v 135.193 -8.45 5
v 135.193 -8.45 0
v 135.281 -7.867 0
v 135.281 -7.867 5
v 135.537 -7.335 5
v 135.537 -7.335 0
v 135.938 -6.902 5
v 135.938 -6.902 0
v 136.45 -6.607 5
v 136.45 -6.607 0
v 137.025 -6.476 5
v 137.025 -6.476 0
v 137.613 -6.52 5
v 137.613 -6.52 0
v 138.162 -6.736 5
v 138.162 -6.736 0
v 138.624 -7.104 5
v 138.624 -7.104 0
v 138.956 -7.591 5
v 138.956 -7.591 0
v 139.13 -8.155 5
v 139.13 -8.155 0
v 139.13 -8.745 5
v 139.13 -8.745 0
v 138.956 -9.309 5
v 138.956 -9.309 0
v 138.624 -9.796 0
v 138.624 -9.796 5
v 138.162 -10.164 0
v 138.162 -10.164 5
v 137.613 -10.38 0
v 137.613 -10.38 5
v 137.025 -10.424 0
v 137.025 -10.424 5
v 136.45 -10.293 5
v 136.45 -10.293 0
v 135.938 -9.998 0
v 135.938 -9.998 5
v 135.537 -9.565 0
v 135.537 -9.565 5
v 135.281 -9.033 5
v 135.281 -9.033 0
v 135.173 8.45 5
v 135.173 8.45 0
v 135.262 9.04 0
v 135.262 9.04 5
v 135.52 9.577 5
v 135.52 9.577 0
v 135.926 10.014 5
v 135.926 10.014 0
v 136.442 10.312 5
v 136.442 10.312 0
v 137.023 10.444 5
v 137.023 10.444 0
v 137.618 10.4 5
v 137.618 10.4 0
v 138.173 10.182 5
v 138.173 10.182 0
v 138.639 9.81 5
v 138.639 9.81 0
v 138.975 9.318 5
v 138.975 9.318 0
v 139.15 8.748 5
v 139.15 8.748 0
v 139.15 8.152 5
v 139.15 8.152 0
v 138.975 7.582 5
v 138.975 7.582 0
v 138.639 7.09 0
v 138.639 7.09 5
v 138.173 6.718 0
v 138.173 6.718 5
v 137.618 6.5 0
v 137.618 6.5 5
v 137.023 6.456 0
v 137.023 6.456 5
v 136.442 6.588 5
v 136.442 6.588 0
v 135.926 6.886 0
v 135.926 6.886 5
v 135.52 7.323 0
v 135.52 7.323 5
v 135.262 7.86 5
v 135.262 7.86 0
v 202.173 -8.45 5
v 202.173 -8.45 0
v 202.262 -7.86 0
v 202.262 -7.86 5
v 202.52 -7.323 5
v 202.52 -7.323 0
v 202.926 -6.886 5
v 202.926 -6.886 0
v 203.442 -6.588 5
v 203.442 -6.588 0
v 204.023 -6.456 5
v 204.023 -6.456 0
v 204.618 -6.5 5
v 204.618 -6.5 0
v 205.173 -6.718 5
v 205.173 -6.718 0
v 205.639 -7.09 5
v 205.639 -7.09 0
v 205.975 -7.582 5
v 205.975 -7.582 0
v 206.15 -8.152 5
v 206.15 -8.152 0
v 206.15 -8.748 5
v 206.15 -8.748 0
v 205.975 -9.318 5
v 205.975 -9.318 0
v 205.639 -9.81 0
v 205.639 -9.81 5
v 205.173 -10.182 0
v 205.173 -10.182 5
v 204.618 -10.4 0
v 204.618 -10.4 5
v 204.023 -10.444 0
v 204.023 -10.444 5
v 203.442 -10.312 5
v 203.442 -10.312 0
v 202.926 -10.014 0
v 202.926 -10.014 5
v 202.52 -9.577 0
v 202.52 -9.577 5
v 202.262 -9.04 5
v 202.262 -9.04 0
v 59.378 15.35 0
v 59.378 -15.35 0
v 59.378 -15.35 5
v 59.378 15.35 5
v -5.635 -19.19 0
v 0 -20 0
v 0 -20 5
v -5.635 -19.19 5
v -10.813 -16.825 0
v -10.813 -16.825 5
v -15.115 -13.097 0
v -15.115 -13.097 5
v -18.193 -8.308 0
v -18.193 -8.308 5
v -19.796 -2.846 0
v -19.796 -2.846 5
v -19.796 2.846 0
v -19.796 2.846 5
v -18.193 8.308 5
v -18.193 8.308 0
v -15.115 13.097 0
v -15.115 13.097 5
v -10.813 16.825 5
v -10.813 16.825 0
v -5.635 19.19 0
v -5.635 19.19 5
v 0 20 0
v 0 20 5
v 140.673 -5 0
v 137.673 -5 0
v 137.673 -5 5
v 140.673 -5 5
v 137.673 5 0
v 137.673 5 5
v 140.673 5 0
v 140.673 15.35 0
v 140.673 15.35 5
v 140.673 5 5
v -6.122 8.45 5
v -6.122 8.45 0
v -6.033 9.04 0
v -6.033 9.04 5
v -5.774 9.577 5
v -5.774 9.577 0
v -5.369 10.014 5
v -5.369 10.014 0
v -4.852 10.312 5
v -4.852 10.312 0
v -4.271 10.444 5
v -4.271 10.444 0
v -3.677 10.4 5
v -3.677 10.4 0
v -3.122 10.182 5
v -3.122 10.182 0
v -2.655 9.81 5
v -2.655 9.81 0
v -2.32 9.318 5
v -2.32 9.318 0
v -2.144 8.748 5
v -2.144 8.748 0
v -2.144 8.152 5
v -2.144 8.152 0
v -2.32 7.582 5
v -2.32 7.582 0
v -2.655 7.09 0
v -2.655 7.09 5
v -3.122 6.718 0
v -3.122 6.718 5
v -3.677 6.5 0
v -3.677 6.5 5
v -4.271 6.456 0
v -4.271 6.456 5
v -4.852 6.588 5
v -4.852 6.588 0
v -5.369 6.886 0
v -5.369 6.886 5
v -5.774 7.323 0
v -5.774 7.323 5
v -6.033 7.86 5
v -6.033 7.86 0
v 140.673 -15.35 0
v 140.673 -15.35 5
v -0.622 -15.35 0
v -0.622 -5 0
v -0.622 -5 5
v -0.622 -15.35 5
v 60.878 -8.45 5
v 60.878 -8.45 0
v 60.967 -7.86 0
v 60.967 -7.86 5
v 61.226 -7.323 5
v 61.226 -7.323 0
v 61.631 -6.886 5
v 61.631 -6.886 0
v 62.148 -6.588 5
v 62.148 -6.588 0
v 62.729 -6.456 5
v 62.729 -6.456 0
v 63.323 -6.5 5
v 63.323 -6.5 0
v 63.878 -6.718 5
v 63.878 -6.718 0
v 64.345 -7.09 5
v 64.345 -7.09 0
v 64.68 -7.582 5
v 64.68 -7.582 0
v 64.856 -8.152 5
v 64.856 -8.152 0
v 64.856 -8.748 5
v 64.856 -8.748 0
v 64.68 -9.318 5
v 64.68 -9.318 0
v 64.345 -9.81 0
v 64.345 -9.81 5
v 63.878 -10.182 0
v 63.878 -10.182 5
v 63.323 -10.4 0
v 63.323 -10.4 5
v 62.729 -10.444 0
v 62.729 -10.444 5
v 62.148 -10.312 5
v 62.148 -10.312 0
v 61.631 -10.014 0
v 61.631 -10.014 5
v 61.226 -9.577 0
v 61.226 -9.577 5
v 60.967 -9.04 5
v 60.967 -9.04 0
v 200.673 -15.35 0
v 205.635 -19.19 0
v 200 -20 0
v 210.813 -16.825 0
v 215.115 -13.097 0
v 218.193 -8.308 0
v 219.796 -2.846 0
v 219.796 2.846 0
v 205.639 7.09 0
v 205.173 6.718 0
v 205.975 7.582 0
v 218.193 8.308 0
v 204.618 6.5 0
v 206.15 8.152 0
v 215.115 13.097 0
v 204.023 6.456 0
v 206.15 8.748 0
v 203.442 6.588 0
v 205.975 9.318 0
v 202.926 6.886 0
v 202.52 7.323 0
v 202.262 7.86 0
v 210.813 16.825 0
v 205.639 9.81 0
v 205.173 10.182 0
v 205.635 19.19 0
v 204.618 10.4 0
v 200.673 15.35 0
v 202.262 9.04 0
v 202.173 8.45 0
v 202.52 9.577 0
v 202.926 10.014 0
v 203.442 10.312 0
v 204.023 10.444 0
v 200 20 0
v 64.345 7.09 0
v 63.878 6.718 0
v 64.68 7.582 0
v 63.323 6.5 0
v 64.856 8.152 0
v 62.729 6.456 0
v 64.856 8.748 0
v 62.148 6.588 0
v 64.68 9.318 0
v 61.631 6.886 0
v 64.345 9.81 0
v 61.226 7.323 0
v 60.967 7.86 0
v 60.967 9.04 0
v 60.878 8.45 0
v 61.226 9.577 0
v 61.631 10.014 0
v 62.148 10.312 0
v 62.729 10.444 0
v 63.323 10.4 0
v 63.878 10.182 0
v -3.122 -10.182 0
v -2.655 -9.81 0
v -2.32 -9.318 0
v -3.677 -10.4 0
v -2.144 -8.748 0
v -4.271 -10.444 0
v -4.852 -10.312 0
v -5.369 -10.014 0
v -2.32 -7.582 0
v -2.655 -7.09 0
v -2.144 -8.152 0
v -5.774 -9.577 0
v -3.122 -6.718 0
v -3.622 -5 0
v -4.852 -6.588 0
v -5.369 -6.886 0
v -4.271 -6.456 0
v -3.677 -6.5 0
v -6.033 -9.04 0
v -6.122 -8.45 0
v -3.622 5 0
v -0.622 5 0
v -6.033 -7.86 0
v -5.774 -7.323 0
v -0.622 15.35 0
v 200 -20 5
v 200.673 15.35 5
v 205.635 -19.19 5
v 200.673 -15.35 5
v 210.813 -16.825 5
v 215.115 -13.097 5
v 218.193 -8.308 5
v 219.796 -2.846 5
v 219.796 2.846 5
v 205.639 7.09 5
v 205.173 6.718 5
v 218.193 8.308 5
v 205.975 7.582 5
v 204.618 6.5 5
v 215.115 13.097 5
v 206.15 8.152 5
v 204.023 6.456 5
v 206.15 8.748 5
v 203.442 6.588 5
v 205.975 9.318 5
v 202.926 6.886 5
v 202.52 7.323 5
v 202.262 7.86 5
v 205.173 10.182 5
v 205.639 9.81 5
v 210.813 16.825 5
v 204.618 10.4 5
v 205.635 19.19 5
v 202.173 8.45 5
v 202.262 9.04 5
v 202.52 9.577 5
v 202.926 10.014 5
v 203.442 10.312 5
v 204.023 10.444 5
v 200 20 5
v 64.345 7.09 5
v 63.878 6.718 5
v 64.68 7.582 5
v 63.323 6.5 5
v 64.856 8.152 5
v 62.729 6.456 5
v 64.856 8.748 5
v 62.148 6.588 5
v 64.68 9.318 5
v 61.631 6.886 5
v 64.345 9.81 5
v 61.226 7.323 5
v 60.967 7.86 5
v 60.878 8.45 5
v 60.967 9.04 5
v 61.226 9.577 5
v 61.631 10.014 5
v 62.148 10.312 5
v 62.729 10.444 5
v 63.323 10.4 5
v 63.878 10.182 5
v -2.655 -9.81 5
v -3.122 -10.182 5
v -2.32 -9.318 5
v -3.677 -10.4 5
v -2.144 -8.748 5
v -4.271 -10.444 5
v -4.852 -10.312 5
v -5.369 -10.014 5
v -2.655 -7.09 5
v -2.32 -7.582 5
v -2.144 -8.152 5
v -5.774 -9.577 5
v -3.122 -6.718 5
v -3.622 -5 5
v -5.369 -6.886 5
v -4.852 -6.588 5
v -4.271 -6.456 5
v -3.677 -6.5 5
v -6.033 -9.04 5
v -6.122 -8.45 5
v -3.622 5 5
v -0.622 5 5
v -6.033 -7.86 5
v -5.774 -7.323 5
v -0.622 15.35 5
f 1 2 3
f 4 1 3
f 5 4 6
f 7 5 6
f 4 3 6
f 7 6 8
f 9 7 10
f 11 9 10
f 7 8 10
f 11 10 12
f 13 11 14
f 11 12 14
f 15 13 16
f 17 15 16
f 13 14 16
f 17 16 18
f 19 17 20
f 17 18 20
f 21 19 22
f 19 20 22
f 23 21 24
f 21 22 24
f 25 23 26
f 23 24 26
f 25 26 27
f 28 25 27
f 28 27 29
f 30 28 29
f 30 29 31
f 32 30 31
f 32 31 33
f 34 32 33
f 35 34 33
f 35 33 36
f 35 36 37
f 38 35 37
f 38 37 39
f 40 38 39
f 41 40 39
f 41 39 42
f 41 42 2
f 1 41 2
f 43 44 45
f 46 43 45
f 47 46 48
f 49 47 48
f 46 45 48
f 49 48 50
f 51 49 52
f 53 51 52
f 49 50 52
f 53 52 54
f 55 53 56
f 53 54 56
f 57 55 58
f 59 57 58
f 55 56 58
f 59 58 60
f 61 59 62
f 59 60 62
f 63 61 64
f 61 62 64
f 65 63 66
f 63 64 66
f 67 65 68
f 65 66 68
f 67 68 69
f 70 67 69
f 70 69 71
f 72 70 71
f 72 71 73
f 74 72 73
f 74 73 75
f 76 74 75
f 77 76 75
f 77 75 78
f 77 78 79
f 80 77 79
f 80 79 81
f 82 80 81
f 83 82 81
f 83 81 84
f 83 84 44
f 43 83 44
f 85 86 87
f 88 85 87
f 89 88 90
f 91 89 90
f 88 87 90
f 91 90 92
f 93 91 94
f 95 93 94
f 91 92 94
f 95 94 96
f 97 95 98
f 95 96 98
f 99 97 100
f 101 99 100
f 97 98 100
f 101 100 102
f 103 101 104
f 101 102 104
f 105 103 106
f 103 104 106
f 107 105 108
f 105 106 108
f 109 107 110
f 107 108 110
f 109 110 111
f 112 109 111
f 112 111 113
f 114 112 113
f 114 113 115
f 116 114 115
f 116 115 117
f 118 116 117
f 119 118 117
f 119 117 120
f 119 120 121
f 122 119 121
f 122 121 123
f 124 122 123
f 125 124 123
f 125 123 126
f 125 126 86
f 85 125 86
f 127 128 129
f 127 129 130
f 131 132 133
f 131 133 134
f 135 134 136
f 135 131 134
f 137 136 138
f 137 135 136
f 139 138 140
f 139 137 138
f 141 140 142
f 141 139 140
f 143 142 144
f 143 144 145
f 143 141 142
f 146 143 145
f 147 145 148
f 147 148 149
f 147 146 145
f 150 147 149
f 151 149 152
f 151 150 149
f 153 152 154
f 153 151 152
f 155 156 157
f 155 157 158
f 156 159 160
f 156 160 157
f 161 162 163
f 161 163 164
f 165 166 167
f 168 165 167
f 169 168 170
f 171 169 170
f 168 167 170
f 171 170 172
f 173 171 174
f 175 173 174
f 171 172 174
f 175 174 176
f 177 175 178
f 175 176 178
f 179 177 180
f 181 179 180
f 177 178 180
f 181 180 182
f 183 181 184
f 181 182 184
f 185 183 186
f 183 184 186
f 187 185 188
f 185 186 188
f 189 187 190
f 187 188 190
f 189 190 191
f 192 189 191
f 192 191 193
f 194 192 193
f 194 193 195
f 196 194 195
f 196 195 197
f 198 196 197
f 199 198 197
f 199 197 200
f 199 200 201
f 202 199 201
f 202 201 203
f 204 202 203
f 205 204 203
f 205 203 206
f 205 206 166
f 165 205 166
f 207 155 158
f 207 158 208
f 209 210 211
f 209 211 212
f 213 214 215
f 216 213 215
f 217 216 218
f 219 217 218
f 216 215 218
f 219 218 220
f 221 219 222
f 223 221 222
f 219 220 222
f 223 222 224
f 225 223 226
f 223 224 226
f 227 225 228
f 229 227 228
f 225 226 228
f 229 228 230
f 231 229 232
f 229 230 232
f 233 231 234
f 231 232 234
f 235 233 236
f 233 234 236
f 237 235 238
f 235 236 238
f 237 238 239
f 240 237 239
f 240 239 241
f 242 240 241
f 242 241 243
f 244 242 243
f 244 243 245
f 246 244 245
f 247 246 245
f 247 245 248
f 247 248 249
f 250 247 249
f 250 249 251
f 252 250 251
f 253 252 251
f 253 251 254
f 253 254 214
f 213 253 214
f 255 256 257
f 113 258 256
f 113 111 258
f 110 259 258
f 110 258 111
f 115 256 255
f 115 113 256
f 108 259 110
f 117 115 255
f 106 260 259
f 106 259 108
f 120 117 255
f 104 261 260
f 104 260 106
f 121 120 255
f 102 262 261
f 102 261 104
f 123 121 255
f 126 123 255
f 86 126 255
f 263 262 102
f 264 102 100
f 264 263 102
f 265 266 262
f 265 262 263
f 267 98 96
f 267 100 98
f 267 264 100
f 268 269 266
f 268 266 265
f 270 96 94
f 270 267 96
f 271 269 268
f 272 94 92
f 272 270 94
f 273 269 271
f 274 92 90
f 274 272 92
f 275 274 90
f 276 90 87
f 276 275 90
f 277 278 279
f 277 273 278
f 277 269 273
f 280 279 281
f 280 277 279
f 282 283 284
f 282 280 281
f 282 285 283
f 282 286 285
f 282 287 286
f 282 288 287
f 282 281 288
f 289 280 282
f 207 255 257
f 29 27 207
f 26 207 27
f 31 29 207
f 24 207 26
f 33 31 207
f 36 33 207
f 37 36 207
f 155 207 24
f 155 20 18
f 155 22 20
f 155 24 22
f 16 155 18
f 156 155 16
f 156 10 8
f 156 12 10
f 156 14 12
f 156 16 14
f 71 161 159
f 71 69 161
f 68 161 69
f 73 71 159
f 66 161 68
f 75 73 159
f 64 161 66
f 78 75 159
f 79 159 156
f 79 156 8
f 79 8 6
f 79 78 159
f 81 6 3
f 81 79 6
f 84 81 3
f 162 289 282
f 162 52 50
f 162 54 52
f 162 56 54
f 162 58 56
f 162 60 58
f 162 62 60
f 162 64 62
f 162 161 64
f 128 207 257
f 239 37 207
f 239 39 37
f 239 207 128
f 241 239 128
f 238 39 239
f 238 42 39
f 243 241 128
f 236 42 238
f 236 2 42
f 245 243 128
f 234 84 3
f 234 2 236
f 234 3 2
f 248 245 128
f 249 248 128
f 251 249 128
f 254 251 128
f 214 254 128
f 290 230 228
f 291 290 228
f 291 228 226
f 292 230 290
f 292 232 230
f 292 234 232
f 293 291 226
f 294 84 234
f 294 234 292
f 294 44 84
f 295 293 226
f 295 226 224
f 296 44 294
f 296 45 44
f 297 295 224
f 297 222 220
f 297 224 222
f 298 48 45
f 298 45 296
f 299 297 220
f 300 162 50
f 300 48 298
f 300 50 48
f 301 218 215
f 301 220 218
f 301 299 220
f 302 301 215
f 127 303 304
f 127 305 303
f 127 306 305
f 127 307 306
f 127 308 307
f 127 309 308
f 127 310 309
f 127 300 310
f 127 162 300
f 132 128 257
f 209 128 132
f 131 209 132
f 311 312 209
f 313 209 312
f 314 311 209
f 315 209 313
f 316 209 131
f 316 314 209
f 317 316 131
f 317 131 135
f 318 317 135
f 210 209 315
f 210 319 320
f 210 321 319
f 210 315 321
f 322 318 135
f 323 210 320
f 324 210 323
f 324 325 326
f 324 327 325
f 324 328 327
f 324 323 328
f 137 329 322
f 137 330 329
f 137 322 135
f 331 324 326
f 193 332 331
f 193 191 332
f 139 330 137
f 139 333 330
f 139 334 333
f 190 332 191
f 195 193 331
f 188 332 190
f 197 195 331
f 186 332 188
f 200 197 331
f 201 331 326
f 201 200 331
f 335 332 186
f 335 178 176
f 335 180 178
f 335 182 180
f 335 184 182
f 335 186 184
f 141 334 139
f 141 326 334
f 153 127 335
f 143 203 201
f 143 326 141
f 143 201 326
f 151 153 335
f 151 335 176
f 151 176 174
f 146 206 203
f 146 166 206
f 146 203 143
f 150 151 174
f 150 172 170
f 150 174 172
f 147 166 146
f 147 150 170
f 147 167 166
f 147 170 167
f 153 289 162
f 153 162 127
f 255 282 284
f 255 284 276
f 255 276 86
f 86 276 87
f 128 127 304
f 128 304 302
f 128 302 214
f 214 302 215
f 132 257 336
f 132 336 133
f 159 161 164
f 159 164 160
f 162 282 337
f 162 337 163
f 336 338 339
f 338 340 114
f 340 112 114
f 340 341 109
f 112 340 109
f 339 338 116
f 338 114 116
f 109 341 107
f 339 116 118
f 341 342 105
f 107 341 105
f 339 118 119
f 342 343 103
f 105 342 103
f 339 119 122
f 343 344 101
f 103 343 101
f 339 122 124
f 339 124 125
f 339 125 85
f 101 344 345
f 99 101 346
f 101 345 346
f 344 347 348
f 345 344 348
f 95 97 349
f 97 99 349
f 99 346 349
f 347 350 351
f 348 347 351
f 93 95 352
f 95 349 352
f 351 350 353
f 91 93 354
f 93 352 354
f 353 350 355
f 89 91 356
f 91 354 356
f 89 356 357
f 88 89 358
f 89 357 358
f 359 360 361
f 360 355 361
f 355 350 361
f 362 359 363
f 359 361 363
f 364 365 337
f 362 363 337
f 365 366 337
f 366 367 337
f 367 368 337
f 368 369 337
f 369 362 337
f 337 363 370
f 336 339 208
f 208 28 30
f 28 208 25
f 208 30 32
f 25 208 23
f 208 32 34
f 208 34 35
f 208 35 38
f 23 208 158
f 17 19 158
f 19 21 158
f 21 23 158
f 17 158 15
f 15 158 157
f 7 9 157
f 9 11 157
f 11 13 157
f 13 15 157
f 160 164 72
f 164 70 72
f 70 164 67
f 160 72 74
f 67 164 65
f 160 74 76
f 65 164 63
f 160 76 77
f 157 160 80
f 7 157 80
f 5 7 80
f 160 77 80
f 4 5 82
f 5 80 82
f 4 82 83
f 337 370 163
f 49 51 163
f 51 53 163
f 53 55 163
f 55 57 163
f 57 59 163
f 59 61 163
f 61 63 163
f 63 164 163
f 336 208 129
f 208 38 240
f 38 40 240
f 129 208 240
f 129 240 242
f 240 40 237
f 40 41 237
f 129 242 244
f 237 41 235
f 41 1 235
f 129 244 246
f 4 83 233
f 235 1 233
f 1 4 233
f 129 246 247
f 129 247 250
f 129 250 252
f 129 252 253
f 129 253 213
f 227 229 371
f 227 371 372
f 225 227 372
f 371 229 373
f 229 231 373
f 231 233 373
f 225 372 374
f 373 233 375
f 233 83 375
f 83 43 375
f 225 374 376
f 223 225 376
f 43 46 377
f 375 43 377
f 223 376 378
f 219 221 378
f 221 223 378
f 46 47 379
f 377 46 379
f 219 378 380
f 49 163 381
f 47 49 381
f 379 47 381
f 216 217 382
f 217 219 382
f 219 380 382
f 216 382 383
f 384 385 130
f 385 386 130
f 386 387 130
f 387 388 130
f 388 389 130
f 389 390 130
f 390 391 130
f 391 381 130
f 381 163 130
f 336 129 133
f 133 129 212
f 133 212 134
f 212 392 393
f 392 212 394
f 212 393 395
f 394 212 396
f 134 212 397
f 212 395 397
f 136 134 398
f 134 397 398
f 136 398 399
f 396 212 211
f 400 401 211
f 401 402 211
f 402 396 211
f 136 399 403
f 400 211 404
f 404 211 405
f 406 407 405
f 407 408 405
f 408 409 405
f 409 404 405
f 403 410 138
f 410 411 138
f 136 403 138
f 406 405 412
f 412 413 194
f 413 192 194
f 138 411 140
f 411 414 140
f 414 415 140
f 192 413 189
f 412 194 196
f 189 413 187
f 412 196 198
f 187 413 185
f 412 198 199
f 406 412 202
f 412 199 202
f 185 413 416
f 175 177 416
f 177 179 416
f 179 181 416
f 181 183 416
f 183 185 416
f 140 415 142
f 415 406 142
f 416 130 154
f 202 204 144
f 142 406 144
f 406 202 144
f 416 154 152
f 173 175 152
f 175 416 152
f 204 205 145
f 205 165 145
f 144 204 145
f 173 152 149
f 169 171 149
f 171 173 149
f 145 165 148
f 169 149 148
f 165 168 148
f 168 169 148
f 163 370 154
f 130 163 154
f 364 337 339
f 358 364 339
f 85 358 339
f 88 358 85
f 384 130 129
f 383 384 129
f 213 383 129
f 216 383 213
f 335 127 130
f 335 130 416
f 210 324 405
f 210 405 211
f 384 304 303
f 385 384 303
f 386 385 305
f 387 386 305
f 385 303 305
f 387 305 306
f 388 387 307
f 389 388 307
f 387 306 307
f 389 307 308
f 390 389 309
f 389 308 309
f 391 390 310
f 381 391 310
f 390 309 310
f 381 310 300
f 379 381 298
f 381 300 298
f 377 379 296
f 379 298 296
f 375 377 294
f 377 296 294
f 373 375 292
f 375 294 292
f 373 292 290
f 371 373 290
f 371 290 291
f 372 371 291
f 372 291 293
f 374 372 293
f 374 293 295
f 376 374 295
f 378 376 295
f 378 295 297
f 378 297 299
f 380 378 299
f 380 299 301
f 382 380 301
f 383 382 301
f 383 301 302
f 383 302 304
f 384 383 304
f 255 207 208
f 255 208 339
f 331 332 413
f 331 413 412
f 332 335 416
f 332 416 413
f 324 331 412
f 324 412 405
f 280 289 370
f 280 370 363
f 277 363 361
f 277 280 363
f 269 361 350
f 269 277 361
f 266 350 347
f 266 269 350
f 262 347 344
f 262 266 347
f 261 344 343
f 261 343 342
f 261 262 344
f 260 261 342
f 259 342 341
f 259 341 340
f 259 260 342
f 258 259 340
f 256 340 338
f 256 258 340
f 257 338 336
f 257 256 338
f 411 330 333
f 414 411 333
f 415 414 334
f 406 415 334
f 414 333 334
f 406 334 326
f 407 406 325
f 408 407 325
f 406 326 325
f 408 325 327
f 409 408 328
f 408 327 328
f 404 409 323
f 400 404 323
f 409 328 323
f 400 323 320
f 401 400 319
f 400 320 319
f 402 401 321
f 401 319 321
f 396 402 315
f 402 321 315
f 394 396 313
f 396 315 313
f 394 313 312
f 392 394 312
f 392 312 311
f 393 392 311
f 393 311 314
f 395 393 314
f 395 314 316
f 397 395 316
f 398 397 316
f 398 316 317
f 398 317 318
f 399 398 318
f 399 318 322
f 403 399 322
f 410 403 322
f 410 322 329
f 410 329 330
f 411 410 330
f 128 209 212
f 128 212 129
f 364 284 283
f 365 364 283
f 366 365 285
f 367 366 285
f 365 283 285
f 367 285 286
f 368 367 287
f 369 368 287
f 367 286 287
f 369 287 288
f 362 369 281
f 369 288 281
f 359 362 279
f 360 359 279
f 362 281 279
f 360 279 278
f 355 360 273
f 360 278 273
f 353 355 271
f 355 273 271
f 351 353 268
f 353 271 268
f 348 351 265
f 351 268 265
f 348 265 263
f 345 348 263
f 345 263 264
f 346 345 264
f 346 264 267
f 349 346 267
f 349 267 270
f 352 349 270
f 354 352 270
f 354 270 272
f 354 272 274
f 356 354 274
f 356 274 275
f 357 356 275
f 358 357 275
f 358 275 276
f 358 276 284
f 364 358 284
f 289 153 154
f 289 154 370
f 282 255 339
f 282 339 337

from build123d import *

# Parameters (mm, degrees)
BOSS_EXTRUDE1_DEPTH = 5
SKETCH2_R           = 2
SKETCH2_R_2         = 1.979542606
CUT_EXTRUDE1_DEPTH  = 10
SKETCH3_R           = 2
CUT_EXTRUDE2_DEPTH  = 10


with BuildPart() as part:
    # Sketch1 → Boss-Extrude1 (new body)
    with BuildSketch(Plane.XY):
        with BuildLine():
            Line((0, 20), (200, 20))
            ThreePointArc((200, 20), (220, 0), (200, -20))
            Line((200, -20), (0, -20))
            ThreePointArc((0, -20), (-20, 0), (0, 20))
        make_face()
        Polygon((-0.621565279, -5), (-0.621565279, -15.35), (59.378434721, -15.35), (59.378434721, 15.35), (-0.621565279, 15.35), (-0.621565279, 5), (-3.621565279, 5), (-3.621565279, -5), align=None, mode=Mode.SUBTRACT)
        Polygon((140.672709247, -5), (140.672709247, -15.35), (200.672709247, -15.35), (200.672709247, 15.35), (140.672709247, 15.35), (140.672709247, 5), (137.672709247, 5), (137.672709247, -5), align=None, mode=Mode.SUBTRACT)
    extrude(amount=BOSS_EXTRUDE1_DEPTH)

    # Sketch2 → Cut-Extrude1 (cut)
    with BuildSketch(Plane(origin=(0, 0, 0), x_dir=(-1, 0, 0), z_dir=(0, 0, -1))):
        with Locations((-137.172709247, 8.45)):
            Circle(SKETCH2_R)
        with Locations((-137.172709247, -8.45)):
            Circle(SKETCH2_R_2)
        with Locations((-204.172709247, 8.45)):
            Circle(SKETCH2_R)
        with Locations((-204.172709247, -8.45)):
            Circle(SKETCH2_R)
    extrude(amount=-CUT_EXTRUDE1_DEPTH, mode=Mode.SUBTRACT)

    # Sketch3 → Cut-Extrude2 (cut)
    with BuildSketch(Plane(origin=(0, 0, 0), x_dir=(-1, 0, 0), z_dir=(0, 0, -1))):
        with Locations((4.121565279, 8.45)):
            Circle(SKETCH3_R)
        with Locations((4.121565279, -8.45)):
            Circle(SKETCH3_R)
        with Locations((-62.878434721, -8.45)):
            Circle(SKETCH3_R)
        with Locations((-62.878434721, 8.45)):
            Circle(SKETCH3_R)
    extrude(amount=-CUT_EXTRUDE2_DEPTH, mode=Mode.SUBTRACT)


solid = part.part
